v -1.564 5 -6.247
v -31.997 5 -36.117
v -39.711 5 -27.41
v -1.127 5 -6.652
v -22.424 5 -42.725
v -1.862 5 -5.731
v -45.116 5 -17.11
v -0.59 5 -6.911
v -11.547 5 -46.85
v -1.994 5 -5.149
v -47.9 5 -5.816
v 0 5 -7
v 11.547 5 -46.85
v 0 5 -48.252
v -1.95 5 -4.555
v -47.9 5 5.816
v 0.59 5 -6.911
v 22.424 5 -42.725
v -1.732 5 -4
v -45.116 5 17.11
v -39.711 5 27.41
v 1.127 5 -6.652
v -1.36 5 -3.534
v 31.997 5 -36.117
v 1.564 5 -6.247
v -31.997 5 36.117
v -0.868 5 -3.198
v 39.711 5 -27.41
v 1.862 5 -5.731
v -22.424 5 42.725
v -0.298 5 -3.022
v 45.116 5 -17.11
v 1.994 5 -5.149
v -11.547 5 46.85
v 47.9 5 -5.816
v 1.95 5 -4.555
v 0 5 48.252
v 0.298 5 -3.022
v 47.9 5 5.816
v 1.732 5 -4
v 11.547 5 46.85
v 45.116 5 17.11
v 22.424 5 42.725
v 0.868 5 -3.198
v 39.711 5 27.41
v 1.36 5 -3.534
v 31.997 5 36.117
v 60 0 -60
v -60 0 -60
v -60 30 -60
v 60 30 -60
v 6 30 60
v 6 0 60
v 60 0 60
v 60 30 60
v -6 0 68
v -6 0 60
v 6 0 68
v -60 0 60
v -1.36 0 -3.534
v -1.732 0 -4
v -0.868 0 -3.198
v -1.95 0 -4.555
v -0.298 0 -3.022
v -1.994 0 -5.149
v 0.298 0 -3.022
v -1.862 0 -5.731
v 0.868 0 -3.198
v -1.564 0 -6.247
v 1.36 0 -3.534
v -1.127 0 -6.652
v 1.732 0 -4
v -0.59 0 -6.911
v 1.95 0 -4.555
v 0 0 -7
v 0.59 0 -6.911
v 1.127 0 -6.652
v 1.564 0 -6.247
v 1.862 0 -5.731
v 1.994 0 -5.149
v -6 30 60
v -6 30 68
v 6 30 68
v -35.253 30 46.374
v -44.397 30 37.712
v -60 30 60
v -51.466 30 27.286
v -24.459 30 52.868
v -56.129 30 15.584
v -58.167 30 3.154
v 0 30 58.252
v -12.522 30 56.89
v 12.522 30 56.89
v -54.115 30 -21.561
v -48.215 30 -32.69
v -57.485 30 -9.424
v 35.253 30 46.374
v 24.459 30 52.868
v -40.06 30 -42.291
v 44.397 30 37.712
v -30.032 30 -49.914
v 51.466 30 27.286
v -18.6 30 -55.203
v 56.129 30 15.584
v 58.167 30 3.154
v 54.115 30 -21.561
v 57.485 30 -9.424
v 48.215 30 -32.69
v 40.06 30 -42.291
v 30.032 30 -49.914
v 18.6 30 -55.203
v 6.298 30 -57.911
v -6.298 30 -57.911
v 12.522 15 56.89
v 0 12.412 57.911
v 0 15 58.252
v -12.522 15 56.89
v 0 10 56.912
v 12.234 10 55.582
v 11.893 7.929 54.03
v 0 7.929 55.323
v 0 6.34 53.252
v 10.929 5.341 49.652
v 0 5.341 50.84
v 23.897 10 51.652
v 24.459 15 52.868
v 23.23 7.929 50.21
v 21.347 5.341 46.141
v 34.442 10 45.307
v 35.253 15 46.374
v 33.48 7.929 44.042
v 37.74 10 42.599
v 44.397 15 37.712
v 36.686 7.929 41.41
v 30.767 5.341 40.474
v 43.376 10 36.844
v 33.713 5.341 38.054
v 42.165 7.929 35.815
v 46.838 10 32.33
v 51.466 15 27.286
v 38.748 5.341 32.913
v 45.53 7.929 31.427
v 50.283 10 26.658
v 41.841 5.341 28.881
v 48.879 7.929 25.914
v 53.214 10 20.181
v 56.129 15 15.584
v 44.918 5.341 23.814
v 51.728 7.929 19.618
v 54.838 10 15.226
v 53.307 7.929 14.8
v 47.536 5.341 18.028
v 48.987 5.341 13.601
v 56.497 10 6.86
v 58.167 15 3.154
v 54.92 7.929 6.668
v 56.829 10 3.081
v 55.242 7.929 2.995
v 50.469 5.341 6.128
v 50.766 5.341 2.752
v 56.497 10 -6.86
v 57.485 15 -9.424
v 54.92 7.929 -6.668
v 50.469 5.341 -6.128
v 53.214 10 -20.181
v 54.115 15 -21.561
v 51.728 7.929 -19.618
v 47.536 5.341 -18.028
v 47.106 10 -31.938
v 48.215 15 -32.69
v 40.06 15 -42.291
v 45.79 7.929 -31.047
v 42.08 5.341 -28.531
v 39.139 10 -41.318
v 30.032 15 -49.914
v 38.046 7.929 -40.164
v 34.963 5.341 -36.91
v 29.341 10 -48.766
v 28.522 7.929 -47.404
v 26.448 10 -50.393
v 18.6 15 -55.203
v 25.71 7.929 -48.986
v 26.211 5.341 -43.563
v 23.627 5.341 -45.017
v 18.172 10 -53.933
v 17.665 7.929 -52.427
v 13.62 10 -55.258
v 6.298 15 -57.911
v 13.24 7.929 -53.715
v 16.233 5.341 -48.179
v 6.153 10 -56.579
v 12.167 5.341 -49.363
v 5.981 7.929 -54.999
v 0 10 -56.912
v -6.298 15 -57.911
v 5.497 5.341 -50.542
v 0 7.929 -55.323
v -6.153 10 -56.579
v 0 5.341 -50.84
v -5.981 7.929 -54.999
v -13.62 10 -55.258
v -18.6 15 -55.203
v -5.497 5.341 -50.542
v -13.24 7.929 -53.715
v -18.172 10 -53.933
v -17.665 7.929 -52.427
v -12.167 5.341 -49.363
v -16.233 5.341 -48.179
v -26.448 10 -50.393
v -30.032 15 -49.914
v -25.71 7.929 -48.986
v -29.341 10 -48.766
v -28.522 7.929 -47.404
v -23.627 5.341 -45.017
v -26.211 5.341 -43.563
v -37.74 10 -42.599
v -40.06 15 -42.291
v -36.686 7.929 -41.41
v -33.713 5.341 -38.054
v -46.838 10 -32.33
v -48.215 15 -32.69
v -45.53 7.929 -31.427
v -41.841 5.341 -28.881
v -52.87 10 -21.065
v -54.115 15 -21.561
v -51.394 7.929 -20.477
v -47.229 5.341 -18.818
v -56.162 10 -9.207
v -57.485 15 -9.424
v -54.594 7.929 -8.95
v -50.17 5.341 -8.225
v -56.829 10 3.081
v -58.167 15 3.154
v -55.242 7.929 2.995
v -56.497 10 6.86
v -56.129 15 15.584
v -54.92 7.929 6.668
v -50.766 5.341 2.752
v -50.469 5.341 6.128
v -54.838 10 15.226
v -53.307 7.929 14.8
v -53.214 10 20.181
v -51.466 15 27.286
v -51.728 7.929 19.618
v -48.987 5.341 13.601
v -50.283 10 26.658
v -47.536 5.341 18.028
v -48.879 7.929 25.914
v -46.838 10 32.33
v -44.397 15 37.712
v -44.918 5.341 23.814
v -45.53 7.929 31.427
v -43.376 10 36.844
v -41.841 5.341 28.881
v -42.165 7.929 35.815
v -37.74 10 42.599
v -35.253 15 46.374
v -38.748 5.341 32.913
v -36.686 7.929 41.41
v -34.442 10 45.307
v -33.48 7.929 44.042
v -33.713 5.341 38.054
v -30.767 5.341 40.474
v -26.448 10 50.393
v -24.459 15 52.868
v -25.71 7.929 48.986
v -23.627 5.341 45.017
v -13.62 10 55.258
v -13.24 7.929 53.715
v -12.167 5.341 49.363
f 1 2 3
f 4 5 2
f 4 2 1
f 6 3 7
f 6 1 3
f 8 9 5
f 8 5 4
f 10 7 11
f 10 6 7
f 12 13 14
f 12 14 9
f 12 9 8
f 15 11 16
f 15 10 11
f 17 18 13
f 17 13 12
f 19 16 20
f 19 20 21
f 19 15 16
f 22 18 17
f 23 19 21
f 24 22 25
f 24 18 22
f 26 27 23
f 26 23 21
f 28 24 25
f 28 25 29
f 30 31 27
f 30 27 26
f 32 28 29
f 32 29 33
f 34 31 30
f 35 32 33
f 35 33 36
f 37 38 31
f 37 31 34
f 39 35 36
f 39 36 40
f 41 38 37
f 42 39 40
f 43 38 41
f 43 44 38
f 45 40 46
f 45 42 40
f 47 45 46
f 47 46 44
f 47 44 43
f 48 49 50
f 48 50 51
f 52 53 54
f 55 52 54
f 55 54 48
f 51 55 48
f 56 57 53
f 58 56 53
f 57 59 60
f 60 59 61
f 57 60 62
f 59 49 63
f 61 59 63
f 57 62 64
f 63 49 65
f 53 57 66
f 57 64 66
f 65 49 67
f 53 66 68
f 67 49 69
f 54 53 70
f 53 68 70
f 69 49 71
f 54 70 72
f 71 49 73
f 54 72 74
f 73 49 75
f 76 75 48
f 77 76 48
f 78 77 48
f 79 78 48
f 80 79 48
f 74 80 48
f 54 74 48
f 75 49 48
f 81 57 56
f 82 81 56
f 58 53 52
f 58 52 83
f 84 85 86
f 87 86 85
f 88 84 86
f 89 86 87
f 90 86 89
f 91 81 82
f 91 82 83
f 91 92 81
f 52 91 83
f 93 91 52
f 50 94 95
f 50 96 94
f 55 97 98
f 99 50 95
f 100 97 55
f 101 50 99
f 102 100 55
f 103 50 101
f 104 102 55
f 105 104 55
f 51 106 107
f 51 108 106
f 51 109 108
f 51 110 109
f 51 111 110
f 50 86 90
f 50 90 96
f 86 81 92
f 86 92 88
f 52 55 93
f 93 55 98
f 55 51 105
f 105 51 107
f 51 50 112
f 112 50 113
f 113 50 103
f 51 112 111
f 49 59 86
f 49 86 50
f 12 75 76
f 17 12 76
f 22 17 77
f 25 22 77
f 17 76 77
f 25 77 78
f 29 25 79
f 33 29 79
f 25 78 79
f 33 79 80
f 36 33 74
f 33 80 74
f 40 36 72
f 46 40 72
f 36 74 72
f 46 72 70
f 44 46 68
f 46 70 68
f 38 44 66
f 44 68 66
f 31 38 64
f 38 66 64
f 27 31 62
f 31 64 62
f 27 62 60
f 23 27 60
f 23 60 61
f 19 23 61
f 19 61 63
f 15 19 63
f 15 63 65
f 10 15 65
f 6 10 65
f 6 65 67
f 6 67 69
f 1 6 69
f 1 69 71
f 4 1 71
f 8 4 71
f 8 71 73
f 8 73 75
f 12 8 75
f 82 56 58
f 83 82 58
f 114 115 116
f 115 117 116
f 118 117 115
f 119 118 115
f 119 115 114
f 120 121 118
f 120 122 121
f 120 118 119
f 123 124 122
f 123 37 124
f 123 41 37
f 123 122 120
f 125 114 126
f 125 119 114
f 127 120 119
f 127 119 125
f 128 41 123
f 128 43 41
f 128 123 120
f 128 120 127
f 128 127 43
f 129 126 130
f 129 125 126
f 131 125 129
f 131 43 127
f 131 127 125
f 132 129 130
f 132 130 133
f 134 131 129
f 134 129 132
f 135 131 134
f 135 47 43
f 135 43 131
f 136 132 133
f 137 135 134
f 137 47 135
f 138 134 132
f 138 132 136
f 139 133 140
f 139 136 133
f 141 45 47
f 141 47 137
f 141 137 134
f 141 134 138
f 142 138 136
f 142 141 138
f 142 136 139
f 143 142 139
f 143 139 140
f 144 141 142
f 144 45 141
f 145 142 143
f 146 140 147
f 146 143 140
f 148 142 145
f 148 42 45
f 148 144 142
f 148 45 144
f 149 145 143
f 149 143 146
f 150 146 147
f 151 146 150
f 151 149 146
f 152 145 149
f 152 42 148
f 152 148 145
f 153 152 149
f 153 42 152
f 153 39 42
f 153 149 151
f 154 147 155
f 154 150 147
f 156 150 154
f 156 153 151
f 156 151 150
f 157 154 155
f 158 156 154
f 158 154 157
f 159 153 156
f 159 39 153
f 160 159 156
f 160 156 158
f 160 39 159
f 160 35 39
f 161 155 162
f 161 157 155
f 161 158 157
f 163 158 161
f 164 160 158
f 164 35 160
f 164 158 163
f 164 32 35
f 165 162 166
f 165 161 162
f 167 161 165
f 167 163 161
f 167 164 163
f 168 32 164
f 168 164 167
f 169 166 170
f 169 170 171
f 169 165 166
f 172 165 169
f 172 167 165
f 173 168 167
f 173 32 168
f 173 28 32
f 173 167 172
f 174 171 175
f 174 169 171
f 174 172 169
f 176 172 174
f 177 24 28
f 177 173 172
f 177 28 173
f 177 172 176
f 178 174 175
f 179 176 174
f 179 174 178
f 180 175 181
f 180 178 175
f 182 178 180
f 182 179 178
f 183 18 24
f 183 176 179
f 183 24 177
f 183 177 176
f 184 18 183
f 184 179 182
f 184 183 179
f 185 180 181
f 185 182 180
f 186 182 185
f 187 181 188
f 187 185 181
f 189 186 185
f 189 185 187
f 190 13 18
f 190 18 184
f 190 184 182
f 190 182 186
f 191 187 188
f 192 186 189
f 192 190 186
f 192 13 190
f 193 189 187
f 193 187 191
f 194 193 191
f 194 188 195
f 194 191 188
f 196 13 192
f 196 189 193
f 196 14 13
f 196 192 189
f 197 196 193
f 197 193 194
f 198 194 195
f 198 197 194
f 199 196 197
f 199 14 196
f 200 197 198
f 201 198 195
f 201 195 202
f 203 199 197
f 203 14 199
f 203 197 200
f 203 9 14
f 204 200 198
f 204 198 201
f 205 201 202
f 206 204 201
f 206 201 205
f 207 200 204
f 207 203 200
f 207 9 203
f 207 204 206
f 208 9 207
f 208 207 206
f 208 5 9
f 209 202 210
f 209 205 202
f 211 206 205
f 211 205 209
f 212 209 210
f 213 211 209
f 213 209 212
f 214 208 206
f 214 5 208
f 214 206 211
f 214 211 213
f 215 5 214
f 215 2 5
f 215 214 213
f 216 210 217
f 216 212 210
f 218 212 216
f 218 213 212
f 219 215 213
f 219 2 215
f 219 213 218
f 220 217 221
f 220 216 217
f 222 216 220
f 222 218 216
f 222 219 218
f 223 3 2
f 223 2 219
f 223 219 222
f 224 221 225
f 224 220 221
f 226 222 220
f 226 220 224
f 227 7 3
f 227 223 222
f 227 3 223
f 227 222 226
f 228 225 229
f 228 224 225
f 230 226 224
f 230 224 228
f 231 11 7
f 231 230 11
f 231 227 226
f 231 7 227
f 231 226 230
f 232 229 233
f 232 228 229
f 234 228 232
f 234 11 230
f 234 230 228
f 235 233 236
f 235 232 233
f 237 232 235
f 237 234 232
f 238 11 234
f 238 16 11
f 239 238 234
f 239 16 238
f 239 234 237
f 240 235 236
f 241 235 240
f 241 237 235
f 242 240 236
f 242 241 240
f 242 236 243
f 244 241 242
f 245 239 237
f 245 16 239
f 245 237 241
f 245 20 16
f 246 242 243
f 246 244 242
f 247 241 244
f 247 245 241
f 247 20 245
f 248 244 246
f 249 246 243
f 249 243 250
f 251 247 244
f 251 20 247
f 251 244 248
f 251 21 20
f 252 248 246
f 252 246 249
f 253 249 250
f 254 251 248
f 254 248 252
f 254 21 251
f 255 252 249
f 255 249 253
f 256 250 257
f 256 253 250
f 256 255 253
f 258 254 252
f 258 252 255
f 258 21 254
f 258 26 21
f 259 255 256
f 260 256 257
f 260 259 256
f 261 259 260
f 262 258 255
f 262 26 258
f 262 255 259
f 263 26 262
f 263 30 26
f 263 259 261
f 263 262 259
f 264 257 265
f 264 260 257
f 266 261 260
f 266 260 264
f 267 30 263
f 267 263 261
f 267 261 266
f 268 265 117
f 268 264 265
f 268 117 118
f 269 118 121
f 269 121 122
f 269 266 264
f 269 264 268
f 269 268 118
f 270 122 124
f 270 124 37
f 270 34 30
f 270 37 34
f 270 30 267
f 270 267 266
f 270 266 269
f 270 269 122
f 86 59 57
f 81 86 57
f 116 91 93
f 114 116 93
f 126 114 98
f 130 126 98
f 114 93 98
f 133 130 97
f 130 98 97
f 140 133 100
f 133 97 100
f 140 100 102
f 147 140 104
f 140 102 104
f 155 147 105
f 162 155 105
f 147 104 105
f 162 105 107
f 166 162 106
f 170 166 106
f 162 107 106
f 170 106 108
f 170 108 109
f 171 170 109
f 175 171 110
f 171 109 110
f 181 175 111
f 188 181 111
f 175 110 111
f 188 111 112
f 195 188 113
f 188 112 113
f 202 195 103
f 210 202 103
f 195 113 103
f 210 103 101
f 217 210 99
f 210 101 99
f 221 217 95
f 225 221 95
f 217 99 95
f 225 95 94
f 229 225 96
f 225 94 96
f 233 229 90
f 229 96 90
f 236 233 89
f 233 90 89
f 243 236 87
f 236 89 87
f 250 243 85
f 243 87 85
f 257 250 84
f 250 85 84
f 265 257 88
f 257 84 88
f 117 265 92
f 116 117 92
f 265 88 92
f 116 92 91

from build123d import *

# Parameters (mm, degrees)
SKETCH_1_W          = 120
SKETCH_1_H          = 120
EXTRUDE_1_DEPTH     = 30
SKETCH_2_R          = 58.25197646
CUT_EXTRUDE_1_DEPTH = 25
FILLET_1_R          = 10
SKETCH_3_R          = 2
CUT_EXTRUDE_2_DEPTH = 25
SKETCH_4_W          = 12
SKETCH_4_H          = 8
EXTRUDE_2_DEPTH     = 30


with BuildPart() as part:
    # 草图1 → 凸台-拉伸1 (new body)
    with BuildSketch(Plane(origin=(0, 0, 0), x_dir=(1, 0, 0), z_dir=(0, 1, 0))):
        Rectangle(SKETCH_1_W, SKETCH_1_H)
    extrude(amount=EXTRUDE_1_DEPTH)

    # 草图2 → 切除-拉伸1 (cut)
    with BuildSketch(Plane(origin=(0, 30, 0), x_dir=(1, 0, 0), z_dir=(0, 1, 0))):
        with Locations(Location((0, 0, 0), (0, 0, 270))):
            Circle(SKETCH_2_R)
    extrude(amount=-CUT_EXTRUDE_1_DEPTH, mode=Mode.SUBTRACT)

    # 圆角1
    fillet_1_edges = [part.edges().sort_by_distance(p)[0] for p in [
        (0, 5, -58.25197646),
    ]]
    fillet(fillet_1_edges, radius=FILLET_1_R)

    # 草图3 → 切除-拉伸2 (cut)
    with BuildSketch(Plane.XZ):
        with Locations(Location((0, -5, 0), (0, 0, 270))):
            Circle(SKETCH_3_R)
    extrude(amount=-CUT_EXTRUDE_2_DEPTH, mode=Mode.SUBTRACT)

    # 草图4 → 凸台-拉伸2 (add)
    with BuildSketch(Plane.XZ):
        with Locations((0, 64)):
            Rectangle(SKETCH_4_W, SKETCH_4_H)
    extrude(amount=-EXTRUDE_2_DEPTH)


solid = part.part
